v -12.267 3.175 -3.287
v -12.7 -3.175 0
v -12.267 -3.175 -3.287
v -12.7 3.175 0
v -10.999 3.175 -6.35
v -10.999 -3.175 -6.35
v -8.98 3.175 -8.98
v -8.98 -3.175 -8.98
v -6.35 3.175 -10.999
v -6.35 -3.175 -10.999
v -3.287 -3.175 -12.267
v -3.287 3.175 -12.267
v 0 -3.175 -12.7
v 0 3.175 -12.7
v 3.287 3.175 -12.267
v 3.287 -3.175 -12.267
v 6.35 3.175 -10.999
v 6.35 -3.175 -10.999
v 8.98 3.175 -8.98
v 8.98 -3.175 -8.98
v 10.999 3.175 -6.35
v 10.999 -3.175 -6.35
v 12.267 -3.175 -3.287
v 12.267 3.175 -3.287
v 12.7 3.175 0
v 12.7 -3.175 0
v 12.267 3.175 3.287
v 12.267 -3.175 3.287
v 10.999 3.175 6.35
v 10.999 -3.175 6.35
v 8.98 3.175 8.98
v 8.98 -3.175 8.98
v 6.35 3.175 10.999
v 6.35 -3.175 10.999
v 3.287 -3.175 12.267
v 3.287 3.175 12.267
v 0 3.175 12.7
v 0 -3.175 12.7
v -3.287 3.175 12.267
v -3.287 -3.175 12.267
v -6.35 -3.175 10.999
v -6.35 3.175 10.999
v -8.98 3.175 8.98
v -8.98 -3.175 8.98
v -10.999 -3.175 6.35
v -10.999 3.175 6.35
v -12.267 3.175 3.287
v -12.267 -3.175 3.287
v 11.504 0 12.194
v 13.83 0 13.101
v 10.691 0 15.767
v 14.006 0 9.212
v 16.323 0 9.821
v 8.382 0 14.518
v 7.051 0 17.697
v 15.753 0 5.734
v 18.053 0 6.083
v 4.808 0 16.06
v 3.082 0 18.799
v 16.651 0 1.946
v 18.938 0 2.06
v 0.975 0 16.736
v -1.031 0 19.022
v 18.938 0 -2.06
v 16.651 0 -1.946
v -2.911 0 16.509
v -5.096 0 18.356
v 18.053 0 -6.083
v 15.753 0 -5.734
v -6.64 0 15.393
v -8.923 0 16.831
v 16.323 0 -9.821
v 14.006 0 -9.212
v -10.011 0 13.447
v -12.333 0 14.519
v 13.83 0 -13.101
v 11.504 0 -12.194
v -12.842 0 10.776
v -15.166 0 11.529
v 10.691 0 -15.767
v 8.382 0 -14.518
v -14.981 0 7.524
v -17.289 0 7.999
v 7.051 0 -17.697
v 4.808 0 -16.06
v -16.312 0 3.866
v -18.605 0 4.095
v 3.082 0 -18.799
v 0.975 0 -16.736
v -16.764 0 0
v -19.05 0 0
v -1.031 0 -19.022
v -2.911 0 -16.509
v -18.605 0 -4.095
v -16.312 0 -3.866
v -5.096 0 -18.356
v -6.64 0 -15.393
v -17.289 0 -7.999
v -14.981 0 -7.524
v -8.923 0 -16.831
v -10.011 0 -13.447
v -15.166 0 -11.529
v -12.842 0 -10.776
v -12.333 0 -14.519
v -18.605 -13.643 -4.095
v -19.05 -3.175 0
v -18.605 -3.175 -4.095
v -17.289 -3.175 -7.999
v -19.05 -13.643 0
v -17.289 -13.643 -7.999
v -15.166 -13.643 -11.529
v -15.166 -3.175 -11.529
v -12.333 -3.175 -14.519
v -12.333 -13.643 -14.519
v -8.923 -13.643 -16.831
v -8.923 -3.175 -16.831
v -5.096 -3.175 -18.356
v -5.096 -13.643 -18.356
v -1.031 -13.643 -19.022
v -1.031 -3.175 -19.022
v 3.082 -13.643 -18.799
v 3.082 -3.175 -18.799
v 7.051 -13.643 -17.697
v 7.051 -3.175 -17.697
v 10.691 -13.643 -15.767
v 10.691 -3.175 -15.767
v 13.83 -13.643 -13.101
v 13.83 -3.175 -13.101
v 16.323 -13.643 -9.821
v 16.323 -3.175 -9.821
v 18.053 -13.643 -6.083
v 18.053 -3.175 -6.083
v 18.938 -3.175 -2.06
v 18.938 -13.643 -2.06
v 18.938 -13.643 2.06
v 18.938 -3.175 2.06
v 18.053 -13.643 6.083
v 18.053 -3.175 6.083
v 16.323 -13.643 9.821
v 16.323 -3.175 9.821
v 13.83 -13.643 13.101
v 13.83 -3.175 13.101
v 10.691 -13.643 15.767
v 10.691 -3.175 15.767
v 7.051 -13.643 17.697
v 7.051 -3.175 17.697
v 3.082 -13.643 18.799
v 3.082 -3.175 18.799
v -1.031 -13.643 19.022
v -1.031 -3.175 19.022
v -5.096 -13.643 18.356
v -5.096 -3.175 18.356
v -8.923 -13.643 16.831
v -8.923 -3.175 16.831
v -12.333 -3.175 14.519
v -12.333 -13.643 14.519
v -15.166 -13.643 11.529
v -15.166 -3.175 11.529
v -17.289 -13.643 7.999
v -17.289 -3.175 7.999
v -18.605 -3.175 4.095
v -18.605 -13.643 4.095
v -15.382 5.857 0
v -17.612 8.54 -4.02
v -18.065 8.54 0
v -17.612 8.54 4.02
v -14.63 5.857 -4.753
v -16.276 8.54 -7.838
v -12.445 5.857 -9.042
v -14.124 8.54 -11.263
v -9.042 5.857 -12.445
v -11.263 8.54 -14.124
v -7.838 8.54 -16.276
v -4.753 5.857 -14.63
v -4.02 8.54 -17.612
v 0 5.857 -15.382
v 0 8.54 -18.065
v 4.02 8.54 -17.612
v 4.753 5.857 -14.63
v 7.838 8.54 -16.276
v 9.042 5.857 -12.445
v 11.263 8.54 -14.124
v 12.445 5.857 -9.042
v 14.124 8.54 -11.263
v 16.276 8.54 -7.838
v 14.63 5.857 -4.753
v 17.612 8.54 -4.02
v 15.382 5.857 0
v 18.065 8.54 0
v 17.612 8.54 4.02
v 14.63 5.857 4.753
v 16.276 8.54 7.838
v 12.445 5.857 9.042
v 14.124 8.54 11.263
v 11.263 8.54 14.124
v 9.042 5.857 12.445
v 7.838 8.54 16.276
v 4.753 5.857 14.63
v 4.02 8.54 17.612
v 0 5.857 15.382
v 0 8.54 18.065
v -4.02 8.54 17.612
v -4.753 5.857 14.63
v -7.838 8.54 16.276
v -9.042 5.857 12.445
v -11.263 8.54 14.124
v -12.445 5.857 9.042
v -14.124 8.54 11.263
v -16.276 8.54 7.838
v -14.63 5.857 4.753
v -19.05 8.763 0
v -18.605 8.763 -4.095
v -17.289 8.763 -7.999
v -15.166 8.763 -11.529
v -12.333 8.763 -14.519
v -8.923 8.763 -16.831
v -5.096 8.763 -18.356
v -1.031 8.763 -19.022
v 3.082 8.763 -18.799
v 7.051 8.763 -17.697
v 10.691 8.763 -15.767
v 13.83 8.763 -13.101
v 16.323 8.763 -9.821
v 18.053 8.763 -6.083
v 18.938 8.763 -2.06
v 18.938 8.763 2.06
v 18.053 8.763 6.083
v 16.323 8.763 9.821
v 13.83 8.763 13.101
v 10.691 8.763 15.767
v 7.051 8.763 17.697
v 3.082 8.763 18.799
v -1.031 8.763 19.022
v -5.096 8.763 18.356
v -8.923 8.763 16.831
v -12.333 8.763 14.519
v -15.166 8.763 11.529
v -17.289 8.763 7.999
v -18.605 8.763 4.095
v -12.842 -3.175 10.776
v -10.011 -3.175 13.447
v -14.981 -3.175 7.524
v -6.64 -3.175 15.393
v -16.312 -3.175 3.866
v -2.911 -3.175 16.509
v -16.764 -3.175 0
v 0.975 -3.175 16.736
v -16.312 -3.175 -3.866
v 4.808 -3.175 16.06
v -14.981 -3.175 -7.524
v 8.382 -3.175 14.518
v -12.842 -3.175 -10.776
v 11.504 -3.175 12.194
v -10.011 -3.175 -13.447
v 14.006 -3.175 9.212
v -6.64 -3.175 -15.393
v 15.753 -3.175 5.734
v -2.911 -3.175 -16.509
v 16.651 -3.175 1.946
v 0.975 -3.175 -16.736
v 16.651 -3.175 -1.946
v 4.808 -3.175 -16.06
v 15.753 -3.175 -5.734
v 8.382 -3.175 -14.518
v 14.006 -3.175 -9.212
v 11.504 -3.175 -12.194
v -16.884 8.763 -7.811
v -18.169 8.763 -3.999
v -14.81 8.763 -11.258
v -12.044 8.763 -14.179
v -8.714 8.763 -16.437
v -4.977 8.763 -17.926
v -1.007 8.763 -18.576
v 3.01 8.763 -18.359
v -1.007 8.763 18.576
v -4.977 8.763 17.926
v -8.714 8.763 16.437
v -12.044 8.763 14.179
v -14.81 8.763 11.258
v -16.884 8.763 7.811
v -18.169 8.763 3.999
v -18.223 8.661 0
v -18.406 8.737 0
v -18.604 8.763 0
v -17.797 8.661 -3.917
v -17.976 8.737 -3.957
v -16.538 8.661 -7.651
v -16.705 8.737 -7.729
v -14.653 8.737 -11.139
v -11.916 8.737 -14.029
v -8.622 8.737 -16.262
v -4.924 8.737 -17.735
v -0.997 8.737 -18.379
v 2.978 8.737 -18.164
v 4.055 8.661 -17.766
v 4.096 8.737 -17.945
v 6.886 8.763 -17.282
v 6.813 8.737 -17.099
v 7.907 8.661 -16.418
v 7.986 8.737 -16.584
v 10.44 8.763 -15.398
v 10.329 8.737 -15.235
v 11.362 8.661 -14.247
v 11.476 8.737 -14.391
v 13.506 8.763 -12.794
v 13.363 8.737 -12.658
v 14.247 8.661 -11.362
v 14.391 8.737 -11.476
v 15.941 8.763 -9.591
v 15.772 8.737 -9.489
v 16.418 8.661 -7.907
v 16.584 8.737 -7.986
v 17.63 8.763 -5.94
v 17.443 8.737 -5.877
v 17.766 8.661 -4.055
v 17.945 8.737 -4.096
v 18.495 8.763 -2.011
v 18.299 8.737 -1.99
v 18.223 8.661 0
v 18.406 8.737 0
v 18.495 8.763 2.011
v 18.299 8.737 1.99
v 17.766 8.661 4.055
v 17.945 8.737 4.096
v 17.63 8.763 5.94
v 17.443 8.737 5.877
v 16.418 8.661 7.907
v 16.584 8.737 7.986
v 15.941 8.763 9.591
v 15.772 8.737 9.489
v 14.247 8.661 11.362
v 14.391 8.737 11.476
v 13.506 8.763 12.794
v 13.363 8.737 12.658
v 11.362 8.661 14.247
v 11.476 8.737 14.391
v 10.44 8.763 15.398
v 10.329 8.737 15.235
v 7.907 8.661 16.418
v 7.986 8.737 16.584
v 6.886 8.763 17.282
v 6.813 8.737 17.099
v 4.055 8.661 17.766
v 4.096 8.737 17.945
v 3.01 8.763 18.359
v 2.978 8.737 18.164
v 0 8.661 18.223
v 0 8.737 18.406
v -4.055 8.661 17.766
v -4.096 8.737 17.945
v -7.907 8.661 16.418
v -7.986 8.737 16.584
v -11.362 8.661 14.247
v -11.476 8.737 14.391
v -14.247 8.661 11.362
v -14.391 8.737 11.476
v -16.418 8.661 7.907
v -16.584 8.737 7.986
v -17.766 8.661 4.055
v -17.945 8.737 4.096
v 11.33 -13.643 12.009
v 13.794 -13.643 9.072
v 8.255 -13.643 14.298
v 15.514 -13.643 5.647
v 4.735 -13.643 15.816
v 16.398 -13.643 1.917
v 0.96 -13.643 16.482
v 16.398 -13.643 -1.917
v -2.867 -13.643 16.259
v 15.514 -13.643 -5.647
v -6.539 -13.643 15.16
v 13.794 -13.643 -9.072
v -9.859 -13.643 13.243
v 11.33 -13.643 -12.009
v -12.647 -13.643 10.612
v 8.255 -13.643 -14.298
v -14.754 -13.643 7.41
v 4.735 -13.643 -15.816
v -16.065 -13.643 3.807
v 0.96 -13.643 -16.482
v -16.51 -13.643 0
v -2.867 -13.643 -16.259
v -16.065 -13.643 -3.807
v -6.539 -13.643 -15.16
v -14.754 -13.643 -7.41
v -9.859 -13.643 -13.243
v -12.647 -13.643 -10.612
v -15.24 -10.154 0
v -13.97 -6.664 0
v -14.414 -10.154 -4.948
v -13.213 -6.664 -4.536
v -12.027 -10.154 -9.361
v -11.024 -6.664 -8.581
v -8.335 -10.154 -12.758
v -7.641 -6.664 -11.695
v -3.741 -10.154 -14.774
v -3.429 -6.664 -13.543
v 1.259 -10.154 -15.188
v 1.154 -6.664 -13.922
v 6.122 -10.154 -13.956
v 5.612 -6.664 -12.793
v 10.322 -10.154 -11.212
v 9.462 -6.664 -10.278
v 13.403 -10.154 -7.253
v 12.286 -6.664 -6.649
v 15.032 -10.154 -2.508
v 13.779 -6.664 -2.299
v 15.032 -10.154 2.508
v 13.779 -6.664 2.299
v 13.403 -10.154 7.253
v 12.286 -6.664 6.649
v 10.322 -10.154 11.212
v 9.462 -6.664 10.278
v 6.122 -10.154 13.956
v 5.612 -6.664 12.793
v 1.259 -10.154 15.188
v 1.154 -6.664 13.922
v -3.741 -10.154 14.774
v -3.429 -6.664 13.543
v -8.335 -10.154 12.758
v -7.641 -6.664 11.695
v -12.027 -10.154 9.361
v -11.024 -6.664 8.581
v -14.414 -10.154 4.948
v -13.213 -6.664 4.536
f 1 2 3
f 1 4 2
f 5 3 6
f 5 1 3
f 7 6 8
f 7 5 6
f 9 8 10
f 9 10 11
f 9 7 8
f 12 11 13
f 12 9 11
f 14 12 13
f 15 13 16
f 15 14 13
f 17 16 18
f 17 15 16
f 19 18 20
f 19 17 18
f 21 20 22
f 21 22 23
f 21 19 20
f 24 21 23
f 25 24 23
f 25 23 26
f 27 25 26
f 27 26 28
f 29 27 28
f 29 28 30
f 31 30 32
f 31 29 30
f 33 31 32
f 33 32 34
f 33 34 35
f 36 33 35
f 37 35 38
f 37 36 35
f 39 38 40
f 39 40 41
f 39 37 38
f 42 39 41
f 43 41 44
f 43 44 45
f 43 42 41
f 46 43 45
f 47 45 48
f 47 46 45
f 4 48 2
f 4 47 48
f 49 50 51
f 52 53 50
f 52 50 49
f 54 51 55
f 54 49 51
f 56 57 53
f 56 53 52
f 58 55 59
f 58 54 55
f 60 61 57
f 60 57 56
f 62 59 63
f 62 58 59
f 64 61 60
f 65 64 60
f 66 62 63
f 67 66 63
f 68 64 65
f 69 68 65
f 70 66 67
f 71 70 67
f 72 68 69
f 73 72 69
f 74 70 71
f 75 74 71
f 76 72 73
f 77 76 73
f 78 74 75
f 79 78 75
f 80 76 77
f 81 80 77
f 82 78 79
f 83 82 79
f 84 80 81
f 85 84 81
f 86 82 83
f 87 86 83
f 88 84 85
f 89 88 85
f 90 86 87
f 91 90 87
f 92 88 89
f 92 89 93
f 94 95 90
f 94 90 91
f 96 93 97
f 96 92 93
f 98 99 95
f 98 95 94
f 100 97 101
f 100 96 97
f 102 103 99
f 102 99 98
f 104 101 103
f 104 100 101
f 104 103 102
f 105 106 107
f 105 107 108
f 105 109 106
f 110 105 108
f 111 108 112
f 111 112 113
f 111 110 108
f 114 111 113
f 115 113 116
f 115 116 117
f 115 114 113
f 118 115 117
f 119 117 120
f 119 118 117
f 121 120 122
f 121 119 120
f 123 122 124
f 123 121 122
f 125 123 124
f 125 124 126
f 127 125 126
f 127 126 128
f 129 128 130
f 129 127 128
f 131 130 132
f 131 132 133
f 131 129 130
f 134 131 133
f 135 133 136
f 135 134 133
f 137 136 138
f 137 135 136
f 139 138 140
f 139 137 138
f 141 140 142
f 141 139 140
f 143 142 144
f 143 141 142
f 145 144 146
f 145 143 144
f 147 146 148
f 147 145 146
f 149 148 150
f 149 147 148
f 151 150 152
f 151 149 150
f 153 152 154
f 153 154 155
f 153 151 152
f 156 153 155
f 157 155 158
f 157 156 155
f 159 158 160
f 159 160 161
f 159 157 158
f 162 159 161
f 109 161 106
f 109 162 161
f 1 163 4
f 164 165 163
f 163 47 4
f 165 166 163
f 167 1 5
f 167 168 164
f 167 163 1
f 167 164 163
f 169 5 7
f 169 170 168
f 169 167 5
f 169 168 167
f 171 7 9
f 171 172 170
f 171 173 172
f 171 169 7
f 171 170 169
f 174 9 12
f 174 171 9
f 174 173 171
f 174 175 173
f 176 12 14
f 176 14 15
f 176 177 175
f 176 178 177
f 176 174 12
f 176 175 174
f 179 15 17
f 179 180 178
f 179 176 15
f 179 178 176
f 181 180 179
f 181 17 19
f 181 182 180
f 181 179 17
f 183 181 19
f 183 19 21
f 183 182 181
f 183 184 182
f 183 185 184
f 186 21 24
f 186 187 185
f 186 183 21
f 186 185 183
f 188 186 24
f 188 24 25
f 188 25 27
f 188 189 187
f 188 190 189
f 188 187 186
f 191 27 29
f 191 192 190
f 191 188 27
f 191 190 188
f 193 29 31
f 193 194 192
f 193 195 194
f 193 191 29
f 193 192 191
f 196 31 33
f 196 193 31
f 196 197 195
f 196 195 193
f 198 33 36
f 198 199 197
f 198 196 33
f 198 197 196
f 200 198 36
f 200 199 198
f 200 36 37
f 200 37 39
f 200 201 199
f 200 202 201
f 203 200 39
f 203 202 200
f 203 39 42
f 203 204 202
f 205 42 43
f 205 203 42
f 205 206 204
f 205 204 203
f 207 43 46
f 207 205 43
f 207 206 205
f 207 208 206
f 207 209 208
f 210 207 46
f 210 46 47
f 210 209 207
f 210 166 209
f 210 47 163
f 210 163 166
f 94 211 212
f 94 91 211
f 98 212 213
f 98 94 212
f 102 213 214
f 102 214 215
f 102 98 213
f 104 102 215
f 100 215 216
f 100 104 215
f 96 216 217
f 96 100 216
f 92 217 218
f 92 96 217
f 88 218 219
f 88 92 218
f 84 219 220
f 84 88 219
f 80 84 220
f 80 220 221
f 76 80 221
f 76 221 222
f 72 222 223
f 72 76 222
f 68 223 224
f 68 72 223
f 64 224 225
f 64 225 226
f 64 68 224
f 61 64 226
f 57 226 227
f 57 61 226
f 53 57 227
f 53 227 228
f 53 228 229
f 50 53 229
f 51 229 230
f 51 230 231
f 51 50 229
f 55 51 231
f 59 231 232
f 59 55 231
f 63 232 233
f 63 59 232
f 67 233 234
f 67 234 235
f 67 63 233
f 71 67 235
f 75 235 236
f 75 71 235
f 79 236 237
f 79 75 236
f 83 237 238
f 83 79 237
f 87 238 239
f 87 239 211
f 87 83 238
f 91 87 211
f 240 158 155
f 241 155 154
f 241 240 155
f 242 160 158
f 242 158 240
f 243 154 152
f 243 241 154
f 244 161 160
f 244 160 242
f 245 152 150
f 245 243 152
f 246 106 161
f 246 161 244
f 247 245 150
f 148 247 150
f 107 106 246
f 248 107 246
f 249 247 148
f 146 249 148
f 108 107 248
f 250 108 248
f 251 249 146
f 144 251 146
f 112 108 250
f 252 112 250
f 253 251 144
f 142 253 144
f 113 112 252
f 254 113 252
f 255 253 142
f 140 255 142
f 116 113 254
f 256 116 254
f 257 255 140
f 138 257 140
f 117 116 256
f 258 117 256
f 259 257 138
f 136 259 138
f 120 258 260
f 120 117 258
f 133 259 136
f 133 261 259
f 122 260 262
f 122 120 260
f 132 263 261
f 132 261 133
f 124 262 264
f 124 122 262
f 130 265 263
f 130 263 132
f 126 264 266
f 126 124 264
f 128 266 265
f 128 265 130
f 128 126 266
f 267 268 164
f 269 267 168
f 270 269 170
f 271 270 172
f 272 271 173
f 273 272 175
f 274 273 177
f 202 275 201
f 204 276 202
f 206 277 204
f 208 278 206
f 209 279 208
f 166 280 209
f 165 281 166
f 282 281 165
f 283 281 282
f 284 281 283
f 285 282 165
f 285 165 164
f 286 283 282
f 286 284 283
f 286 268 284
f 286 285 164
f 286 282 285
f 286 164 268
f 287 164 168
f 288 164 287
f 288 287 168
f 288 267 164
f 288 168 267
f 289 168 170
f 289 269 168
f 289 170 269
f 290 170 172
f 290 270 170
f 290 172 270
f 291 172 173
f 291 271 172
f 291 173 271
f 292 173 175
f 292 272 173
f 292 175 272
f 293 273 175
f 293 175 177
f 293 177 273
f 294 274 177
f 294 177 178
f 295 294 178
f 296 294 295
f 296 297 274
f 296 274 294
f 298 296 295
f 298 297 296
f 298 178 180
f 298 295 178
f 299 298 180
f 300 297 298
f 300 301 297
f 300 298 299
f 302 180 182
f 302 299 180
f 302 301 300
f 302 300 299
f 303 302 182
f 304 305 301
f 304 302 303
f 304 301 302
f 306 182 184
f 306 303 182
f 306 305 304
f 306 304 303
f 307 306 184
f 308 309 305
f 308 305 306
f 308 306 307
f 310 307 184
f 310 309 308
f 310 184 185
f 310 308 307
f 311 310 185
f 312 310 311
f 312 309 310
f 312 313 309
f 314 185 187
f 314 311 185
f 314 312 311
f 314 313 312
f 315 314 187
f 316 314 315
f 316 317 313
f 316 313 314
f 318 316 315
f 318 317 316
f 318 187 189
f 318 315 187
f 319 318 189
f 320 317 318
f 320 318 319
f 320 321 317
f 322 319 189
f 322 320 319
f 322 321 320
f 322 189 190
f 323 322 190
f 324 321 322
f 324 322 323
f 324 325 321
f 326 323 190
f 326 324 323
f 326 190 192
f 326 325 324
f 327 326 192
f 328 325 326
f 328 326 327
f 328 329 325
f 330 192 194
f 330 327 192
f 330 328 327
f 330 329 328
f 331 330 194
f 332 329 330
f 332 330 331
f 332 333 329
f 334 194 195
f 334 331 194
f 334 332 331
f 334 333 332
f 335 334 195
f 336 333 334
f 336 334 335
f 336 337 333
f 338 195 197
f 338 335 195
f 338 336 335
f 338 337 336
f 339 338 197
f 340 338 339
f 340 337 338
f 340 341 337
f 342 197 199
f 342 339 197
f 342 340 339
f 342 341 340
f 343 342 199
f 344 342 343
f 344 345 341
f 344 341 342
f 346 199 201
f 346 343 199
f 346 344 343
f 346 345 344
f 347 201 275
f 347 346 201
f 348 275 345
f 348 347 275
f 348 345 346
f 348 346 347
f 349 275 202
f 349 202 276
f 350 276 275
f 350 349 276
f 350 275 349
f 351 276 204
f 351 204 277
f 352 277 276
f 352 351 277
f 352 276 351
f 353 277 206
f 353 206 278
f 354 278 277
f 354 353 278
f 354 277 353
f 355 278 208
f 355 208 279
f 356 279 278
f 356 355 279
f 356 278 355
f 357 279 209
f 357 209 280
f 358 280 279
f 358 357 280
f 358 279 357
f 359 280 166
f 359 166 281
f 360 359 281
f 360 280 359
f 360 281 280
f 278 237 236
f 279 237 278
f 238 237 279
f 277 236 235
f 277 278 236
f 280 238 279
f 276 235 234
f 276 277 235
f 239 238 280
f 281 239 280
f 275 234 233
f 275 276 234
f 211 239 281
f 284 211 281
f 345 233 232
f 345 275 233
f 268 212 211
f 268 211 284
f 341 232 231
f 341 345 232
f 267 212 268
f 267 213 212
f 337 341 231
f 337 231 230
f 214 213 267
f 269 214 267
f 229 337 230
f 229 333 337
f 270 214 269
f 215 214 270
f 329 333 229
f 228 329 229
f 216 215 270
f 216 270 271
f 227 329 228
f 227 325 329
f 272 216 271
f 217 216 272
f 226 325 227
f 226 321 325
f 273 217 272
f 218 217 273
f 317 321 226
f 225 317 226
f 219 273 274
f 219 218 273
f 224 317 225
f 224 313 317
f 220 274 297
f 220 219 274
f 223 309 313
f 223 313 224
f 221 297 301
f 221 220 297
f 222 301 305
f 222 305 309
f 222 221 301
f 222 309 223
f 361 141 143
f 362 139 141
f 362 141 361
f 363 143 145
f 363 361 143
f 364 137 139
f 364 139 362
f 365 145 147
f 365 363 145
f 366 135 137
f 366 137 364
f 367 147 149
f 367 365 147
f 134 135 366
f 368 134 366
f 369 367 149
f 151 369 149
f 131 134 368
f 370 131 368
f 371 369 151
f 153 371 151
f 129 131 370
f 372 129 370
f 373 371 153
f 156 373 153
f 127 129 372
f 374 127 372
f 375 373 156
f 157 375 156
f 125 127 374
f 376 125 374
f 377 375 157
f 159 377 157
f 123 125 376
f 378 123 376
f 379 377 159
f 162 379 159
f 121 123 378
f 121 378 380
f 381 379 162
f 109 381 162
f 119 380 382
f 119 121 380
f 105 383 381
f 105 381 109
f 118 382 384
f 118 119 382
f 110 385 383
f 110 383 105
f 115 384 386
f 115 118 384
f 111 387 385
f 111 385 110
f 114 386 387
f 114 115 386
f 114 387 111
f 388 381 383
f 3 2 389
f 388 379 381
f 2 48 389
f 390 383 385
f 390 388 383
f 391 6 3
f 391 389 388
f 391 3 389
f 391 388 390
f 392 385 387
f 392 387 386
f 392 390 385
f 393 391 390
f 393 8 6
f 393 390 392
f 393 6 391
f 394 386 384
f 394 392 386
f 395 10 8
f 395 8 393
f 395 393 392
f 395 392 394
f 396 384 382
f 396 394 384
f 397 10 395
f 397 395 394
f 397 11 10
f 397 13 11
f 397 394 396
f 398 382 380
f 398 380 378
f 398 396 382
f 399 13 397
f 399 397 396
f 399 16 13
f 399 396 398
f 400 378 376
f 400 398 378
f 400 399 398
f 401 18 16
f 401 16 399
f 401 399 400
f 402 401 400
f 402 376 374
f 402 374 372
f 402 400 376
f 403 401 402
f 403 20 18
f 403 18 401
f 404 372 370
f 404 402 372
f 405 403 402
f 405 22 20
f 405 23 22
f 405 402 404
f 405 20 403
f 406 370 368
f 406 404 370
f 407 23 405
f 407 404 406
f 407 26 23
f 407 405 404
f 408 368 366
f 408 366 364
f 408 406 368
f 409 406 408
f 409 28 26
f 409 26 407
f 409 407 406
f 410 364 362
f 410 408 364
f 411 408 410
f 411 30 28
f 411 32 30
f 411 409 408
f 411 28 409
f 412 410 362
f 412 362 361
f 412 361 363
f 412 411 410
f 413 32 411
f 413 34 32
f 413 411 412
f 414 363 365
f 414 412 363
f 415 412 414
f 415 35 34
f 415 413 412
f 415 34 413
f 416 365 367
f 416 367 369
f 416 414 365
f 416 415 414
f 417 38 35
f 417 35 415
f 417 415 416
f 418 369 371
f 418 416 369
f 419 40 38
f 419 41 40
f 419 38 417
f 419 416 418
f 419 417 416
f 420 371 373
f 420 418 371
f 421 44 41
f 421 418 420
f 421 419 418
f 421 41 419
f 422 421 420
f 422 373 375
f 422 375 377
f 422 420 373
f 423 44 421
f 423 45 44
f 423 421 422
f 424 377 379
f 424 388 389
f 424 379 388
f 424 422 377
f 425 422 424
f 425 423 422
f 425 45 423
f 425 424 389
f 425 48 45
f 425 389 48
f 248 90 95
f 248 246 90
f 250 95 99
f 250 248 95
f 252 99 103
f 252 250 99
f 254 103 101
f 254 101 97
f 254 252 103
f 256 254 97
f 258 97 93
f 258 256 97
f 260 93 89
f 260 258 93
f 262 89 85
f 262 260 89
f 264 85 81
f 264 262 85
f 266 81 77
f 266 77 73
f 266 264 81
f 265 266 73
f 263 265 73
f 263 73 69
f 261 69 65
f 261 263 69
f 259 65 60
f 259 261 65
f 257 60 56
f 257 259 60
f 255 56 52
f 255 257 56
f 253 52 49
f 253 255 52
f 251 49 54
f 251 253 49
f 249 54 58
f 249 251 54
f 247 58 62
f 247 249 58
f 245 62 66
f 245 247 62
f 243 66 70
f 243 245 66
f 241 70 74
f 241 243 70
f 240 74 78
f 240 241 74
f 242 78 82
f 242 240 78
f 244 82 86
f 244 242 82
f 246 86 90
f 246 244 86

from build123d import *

# Parameters (mm, degrees)
FILLET3_R = 0.762


with BuildPart() as part:
    # Sketch1 → Revolve1 (revolve)
    with BuildSketch(Plane.XY, mode=Mode.PRIVATE) as revolve1_sk:
        Polygon((12.7, -3.175), (12.7, 3.175), (18.288, 8.763), (19.05, 8.763), (19.05, 0), (16.764, 0), (16.764, -3.175), (19.05, -3.175), (19.05, -13.642888968), (16.51, -13.642888968), align=None)
    revolve(revolve1_sk.sketch.rotate(Axis((0, 44.779079664, 0), (0, -1, 0)), 180), axis=Axis((0, 44.779079664, 0), (0, -1, 0)))

    # Fillet3
    fillet3_edges = [part.edges().sort_by_distance(p)[0] for p in [
        (18.288, 8.763, 0),
    ]]
    fillet(fillet3_edges, radius=FILLET3_R)


solid = part.part
